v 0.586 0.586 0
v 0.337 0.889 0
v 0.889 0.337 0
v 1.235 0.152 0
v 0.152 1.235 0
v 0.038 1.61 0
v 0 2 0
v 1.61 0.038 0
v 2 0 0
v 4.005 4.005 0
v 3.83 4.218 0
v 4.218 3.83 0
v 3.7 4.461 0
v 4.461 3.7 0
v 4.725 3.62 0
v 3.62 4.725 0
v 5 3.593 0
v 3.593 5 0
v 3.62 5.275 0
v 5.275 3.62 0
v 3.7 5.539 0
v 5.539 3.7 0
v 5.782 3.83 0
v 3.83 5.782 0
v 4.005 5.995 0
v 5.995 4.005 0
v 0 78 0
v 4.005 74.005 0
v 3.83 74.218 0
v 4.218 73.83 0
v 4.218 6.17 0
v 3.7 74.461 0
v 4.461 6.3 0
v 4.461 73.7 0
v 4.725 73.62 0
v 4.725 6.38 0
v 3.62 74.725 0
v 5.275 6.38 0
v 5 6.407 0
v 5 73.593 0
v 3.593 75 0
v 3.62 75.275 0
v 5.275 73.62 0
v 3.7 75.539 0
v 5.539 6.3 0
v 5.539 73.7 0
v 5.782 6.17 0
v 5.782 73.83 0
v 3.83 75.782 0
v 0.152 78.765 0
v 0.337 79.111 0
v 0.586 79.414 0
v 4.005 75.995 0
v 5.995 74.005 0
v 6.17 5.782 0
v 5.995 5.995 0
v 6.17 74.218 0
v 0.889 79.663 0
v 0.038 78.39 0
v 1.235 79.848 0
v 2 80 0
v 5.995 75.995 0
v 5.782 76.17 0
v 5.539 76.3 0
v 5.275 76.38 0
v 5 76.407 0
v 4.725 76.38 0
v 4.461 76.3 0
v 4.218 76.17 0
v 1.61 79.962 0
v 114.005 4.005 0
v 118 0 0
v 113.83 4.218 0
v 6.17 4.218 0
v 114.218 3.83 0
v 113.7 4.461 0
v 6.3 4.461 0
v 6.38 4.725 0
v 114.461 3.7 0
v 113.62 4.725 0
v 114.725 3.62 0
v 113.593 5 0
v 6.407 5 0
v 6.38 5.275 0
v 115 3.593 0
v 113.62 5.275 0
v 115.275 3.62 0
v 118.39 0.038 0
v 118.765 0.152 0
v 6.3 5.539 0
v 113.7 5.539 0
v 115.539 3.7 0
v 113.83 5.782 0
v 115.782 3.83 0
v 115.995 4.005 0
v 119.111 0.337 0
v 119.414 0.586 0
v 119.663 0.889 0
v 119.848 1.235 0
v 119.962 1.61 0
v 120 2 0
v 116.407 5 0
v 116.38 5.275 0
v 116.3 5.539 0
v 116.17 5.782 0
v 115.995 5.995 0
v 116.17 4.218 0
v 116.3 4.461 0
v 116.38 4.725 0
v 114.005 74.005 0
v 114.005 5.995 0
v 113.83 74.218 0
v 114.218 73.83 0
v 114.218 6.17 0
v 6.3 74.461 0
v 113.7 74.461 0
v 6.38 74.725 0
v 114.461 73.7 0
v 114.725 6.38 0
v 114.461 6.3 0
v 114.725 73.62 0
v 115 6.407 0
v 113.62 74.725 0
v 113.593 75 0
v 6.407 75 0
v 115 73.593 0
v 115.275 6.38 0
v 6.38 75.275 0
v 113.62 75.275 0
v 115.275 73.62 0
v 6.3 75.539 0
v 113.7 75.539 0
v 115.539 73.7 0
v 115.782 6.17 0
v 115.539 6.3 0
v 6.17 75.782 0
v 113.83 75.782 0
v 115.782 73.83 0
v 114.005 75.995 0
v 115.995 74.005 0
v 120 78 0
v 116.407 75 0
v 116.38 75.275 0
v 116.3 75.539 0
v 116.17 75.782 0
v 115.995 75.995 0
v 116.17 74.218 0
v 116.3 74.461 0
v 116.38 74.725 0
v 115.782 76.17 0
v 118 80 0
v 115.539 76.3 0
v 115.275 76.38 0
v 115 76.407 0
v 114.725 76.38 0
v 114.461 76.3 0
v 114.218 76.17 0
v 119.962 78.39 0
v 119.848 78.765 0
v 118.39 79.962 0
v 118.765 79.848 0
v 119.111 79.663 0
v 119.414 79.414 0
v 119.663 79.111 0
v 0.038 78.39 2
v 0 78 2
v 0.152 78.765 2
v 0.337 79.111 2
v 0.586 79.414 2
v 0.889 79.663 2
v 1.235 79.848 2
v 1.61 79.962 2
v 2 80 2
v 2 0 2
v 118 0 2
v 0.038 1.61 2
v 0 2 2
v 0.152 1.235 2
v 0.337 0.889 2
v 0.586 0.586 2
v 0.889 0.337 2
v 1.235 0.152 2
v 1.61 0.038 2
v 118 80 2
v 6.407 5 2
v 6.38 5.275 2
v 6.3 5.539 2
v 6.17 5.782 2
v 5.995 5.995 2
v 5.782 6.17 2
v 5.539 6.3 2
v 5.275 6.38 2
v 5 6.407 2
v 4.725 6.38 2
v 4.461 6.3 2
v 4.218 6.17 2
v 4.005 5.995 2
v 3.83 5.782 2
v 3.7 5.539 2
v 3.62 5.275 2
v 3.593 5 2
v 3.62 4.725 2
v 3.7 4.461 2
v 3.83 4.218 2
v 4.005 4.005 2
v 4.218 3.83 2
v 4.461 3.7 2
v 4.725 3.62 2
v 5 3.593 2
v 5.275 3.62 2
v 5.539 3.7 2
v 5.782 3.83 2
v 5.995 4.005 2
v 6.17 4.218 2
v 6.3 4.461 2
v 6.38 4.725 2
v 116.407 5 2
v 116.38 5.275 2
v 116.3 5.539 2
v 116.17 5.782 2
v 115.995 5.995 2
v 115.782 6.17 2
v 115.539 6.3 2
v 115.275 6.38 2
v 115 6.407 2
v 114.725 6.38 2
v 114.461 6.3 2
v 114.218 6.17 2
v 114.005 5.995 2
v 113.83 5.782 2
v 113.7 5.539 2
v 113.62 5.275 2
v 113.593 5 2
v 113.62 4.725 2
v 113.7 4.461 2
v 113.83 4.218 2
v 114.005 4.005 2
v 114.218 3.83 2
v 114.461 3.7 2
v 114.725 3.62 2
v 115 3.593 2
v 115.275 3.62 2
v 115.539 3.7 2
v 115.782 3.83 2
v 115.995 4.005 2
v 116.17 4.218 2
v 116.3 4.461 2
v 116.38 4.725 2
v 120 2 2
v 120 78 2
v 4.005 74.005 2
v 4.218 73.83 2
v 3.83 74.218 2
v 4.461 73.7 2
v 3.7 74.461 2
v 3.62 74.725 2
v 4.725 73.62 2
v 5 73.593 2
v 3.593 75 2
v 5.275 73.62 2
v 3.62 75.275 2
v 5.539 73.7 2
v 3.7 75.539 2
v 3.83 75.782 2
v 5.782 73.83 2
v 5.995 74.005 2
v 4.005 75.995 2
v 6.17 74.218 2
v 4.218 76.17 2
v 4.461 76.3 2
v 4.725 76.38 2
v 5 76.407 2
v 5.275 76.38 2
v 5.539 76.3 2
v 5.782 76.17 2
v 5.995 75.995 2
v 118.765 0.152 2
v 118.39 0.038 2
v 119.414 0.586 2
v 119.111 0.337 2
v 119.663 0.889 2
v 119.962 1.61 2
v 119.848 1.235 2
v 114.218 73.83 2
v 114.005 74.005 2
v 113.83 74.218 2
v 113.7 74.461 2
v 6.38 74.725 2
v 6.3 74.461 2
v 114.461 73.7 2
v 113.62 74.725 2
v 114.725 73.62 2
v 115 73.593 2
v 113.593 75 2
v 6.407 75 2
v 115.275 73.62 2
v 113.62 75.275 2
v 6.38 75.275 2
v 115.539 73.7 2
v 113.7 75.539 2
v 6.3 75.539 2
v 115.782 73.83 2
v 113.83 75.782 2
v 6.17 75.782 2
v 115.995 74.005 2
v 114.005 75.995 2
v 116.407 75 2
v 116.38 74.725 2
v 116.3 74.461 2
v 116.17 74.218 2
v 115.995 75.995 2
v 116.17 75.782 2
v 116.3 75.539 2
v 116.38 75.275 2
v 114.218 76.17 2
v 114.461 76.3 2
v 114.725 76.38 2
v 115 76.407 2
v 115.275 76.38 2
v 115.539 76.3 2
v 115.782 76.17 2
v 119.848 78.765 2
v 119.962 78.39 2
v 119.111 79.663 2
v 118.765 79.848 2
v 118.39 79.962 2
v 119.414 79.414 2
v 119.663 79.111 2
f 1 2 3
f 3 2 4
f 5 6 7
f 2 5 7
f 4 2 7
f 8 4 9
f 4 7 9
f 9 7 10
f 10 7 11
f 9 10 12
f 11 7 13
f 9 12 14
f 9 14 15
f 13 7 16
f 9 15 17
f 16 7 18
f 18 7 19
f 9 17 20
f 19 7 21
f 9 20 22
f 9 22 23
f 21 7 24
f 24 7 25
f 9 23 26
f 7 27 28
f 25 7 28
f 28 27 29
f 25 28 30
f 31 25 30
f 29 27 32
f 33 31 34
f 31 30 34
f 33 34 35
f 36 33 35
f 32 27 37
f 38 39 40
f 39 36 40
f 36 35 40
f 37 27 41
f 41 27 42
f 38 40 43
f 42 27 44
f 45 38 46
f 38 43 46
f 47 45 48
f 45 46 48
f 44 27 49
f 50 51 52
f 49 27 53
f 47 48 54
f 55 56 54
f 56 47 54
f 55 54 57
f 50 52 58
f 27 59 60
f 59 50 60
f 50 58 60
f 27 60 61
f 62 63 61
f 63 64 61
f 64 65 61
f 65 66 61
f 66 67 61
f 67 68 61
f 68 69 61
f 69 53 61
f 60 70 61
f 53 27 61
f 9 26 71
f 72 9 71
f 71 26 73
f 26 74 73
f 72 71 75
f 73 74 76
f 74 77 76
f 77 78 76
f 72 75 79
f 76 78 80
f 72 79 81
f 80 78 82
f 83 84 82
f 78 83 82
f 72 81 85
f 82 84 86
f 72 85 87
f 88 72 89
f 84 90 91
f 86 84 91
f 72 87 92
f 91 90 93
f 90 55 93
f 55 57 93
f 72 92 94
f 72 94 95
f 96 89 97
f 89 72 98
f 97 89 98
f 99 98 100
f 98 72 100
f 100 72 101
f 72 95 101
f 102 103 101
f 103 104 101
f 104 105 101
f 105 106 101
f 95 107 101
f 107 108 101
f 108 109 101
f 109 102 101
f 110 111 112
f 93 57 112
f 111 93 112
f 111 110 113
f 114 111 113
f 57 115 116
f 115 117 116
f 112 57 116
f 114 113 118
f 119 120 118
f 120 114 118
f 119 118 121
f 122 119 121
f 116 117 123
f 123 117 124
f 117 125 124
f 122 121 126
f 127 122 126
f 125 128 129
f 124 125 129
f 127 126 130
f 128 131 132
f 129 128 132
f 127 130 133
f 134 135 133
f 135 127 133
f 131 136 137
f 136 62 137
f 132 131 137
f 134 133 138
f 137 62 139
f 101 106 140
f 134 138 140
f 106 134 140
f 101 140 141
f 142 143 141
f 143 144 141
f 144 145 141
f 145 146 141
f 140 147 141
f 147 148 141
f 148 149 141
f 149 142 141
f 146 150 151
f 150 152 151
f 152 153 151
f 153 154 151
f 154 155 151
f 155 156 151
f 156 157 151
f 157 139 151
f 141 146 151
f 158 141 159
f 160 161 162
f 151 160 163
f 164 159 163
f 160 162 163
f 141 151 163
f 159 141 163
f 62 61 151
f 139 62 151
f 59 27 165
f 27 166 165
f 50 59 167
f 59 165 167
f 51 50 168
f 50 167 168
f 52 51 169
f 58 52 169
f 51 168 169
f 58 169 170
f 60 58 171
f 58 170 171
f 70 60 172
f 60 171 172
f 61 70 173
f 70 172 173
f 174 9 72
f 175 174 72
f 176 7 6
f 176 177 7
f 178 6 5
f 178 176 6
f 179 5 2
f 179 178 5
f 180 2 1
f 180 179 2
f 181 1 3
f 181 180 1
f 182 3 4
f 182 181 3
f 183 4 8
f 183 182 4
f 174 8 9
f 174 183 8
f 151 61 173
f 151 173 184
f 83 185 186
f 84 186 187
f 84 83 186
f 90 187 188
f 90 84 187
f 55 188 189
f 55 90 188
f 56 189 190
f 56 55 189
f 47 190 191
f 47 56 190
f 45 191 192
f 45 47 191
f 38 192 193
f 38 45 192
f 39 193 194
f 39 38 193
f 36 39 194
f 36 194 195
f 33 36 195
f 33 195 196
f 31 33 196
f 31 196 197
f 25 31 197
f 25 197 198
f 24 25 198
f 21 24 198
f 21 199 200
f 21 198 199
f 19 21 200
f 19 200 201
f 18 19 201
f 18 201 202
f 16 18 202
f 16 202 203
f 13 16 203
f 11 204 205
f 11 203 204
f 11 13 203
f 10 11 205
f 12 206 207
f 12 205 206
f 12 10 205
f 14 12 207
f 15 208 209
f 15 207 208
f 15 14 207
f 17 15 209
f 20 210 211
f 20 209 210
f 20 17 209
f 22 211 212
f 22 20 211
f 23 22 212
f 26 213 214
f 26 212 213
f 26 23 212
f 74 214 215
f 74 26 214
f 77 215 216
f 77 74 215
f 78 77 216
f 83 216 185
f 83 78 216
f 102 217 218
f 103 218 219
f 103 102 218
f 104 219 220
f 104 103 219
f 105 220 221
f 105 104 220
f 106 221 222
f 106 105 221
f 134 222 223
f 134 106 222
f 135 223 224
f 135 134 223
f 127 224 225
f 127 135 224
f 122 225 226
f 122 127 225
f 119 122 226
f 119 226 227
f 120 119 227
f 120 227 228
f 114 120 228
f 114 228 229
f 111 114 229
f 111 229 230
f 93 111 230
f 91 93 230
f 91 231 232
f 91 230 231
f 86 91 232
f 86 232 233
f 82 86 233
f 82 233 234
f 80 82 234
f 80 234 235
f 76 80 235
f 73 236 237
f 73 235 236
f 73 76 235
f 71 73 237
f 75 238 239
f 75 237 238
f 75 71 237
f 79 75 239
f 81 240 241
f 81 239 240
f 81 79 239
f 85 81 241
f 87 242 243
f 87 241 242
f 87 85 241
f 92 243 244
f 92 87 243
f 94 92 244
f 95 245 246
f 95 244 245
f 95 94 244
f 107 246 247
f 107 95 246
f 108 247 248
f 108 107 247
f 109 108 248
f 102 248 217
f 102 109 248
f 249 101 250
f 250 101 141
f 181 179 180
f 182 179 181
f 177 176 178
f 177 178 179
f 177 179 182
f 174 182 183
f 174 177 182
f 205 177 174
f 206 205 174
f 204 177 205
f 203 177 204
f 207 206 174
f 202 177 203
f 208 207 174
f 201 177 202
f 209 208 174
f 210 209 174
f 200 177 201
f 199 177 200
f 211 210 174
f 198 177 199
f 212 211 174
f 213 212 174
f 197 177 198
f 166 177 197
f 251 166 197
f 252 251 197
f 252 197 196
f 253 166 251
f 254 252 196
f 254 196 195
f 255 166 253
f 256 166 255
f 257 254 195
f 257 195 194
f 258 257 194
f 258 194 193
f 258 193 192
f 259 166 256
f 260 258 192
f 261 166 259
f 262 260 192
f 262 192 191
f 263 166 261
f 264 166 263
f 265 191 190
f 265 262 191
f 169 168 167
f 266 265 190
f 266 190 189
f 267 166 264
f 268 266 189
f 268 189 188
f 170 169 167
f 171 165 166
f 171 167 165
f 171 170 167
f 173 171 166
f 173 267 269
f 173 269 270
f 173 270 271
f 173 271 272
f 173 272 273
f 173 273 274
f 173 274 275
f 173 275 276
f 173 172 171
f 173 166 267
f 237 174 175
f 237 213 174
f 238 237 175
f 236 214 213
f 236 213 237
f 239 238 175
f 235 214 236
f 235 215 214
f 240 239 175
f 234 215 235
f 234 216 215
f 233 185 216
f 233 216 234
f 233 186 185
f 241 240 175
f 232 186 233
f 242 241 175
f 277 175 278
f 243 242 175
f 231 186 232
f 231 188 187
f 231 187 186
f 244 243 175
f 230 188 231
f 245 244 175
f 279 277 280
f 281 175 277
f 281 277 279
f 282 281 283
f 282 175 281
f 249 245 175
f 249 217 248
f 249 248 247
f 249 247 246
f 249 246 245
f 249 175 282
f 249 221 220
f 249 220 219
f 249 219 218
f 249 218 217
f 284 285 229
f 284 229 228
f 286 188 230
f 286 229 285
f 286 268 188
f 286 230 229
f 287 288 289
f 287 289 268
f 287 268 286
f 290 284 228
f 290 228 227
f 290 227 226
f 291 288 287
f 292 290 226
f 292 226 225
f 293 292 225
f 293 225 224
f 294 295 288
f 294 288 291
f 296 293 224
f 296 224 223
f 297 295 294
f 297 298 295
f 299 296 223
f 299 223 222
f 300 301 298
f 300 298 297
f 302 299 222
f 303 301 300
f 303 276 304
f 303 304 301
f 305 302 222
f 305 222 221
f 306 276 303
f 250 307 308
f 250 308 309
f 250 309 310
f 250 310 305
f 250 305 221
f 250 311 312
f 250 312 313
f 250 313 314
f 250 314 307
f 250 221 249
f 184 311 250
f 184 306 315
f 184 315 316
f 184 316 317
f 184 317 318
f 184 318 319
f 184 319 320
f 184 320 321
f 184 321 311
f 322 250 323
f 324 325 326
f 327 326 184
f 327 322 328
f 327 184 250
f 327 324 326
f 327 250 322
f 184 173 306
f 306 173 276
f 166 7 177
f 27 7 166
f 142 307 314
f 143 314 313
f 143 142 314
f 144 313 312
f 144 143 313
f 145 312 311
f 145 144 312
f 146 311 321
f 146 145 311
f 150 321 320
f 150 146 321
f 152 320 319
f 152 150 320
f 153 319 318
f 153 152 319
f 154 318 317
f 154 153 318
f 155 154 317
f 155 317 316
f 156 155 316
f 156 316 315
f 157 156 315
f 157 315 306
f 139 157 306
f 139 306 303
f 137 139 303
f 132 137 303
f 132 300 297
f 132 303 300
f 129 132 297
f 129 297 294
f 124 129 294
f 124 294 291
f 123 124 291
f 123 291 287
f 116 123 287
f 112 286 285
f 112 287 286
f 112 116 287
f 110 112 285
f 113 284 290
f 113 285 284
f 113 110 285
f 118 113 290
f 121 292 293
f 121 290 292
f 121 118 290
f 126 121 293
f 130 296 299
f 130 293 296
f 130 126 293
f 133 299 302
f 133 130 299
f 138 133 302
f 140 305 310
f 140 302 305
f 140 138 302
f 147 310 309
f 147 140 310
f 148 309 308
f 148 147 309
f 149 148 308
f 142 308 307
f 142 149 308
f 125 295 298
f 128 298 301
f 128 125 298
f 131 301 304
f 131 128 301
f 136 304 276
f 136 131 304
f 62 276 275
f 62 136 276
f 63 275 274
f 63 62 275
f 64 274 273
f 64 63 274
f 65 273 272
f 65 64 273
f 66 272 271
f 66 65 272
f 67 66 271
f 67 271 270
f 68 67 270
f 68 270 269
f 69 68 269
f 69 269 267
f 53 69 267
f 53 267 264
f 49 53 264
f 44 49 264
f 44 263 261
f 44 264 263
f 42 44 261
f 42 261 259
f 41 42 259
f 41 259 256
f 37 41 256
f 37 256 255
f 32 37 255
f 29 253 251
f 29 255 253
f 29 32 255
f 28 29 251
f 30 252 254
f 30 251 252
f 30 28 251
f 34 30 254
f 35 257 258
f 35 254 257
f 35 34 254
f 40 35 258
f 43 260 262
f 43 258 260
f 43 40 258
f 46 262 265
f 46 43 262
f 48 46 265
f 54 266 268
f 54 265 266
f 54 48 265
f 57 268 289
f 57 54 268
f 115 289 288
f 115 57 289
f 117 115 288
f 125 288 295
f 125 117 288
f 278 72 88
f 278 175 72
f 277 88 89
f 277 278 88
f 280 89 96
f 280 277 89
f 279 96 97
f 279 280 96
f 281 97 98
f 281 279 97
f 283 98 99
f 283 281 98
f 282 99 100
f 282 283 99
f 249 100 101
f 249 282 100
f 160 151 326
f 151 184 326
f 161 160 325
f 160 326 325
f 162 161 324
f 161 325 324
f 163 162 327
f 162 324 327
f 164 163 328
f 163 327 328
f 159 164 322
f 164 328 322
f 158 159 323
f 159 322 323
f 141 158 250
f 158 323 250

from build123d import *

# Parameters (mm, degrees)
ESQUISSE1_W             = 120
ESQUISSE1_H             = 80
BOSS_EXTRU_1_DEPTH      = 2
CONG_4_R                = 2
CONG_5_R                = 2
ESQUISSE2_R             = 1.407340655
ENL_V_MAT_EXTRU_1_DEPTH = 3


with BuildPart() as part:
    # Esquisse1 → Boss.-Extru.1 (new body)
    with BuildSketch(Plane.XY):
        with Locations((60, 40)):
            Rectangle(ESQUISSE1_W, ESQUISSE1_H)
    extrude(amount=BOSS_EXTRU_1_DEPTH)

    # Congé4
    cong_4_edges = [part.edges().sort_by_distance(p)[0] for p in [
        (0, 0, 1),
    ]]
    fillet(cong_4_edges, radius=CONG_4_R)

    # Congé5
    cong_5_edges = [part.edges().sort_by_distance(p)[0] for p in [
        (0, 80, 1),
        (120, 80, 1),
        (120, 0, 1),
    ]]
    fillet(cong_5_edges, radius=CONG_5_R)

    # Esquisse2 → Enlèv. mat.-Extru.1 (cut, through all)
    with BuildSketch(Plane.XY):
        with Locations((5, 75)):
            Circle(ESQUISSE2_R)
        with Locations((5, 5)):
            Circle(ESQUISSE2_R)
        with Locations((115, 5)):
            Circle(ESQUISSE2_R)
        with Locations((115, 75)):
            Circle(ESQUISSE2_R)
    extrude(amount=ENL_V_MAT_EXTRU_1_DEPTH, mode=Mode.SUBTRACT)


solid = part.part
